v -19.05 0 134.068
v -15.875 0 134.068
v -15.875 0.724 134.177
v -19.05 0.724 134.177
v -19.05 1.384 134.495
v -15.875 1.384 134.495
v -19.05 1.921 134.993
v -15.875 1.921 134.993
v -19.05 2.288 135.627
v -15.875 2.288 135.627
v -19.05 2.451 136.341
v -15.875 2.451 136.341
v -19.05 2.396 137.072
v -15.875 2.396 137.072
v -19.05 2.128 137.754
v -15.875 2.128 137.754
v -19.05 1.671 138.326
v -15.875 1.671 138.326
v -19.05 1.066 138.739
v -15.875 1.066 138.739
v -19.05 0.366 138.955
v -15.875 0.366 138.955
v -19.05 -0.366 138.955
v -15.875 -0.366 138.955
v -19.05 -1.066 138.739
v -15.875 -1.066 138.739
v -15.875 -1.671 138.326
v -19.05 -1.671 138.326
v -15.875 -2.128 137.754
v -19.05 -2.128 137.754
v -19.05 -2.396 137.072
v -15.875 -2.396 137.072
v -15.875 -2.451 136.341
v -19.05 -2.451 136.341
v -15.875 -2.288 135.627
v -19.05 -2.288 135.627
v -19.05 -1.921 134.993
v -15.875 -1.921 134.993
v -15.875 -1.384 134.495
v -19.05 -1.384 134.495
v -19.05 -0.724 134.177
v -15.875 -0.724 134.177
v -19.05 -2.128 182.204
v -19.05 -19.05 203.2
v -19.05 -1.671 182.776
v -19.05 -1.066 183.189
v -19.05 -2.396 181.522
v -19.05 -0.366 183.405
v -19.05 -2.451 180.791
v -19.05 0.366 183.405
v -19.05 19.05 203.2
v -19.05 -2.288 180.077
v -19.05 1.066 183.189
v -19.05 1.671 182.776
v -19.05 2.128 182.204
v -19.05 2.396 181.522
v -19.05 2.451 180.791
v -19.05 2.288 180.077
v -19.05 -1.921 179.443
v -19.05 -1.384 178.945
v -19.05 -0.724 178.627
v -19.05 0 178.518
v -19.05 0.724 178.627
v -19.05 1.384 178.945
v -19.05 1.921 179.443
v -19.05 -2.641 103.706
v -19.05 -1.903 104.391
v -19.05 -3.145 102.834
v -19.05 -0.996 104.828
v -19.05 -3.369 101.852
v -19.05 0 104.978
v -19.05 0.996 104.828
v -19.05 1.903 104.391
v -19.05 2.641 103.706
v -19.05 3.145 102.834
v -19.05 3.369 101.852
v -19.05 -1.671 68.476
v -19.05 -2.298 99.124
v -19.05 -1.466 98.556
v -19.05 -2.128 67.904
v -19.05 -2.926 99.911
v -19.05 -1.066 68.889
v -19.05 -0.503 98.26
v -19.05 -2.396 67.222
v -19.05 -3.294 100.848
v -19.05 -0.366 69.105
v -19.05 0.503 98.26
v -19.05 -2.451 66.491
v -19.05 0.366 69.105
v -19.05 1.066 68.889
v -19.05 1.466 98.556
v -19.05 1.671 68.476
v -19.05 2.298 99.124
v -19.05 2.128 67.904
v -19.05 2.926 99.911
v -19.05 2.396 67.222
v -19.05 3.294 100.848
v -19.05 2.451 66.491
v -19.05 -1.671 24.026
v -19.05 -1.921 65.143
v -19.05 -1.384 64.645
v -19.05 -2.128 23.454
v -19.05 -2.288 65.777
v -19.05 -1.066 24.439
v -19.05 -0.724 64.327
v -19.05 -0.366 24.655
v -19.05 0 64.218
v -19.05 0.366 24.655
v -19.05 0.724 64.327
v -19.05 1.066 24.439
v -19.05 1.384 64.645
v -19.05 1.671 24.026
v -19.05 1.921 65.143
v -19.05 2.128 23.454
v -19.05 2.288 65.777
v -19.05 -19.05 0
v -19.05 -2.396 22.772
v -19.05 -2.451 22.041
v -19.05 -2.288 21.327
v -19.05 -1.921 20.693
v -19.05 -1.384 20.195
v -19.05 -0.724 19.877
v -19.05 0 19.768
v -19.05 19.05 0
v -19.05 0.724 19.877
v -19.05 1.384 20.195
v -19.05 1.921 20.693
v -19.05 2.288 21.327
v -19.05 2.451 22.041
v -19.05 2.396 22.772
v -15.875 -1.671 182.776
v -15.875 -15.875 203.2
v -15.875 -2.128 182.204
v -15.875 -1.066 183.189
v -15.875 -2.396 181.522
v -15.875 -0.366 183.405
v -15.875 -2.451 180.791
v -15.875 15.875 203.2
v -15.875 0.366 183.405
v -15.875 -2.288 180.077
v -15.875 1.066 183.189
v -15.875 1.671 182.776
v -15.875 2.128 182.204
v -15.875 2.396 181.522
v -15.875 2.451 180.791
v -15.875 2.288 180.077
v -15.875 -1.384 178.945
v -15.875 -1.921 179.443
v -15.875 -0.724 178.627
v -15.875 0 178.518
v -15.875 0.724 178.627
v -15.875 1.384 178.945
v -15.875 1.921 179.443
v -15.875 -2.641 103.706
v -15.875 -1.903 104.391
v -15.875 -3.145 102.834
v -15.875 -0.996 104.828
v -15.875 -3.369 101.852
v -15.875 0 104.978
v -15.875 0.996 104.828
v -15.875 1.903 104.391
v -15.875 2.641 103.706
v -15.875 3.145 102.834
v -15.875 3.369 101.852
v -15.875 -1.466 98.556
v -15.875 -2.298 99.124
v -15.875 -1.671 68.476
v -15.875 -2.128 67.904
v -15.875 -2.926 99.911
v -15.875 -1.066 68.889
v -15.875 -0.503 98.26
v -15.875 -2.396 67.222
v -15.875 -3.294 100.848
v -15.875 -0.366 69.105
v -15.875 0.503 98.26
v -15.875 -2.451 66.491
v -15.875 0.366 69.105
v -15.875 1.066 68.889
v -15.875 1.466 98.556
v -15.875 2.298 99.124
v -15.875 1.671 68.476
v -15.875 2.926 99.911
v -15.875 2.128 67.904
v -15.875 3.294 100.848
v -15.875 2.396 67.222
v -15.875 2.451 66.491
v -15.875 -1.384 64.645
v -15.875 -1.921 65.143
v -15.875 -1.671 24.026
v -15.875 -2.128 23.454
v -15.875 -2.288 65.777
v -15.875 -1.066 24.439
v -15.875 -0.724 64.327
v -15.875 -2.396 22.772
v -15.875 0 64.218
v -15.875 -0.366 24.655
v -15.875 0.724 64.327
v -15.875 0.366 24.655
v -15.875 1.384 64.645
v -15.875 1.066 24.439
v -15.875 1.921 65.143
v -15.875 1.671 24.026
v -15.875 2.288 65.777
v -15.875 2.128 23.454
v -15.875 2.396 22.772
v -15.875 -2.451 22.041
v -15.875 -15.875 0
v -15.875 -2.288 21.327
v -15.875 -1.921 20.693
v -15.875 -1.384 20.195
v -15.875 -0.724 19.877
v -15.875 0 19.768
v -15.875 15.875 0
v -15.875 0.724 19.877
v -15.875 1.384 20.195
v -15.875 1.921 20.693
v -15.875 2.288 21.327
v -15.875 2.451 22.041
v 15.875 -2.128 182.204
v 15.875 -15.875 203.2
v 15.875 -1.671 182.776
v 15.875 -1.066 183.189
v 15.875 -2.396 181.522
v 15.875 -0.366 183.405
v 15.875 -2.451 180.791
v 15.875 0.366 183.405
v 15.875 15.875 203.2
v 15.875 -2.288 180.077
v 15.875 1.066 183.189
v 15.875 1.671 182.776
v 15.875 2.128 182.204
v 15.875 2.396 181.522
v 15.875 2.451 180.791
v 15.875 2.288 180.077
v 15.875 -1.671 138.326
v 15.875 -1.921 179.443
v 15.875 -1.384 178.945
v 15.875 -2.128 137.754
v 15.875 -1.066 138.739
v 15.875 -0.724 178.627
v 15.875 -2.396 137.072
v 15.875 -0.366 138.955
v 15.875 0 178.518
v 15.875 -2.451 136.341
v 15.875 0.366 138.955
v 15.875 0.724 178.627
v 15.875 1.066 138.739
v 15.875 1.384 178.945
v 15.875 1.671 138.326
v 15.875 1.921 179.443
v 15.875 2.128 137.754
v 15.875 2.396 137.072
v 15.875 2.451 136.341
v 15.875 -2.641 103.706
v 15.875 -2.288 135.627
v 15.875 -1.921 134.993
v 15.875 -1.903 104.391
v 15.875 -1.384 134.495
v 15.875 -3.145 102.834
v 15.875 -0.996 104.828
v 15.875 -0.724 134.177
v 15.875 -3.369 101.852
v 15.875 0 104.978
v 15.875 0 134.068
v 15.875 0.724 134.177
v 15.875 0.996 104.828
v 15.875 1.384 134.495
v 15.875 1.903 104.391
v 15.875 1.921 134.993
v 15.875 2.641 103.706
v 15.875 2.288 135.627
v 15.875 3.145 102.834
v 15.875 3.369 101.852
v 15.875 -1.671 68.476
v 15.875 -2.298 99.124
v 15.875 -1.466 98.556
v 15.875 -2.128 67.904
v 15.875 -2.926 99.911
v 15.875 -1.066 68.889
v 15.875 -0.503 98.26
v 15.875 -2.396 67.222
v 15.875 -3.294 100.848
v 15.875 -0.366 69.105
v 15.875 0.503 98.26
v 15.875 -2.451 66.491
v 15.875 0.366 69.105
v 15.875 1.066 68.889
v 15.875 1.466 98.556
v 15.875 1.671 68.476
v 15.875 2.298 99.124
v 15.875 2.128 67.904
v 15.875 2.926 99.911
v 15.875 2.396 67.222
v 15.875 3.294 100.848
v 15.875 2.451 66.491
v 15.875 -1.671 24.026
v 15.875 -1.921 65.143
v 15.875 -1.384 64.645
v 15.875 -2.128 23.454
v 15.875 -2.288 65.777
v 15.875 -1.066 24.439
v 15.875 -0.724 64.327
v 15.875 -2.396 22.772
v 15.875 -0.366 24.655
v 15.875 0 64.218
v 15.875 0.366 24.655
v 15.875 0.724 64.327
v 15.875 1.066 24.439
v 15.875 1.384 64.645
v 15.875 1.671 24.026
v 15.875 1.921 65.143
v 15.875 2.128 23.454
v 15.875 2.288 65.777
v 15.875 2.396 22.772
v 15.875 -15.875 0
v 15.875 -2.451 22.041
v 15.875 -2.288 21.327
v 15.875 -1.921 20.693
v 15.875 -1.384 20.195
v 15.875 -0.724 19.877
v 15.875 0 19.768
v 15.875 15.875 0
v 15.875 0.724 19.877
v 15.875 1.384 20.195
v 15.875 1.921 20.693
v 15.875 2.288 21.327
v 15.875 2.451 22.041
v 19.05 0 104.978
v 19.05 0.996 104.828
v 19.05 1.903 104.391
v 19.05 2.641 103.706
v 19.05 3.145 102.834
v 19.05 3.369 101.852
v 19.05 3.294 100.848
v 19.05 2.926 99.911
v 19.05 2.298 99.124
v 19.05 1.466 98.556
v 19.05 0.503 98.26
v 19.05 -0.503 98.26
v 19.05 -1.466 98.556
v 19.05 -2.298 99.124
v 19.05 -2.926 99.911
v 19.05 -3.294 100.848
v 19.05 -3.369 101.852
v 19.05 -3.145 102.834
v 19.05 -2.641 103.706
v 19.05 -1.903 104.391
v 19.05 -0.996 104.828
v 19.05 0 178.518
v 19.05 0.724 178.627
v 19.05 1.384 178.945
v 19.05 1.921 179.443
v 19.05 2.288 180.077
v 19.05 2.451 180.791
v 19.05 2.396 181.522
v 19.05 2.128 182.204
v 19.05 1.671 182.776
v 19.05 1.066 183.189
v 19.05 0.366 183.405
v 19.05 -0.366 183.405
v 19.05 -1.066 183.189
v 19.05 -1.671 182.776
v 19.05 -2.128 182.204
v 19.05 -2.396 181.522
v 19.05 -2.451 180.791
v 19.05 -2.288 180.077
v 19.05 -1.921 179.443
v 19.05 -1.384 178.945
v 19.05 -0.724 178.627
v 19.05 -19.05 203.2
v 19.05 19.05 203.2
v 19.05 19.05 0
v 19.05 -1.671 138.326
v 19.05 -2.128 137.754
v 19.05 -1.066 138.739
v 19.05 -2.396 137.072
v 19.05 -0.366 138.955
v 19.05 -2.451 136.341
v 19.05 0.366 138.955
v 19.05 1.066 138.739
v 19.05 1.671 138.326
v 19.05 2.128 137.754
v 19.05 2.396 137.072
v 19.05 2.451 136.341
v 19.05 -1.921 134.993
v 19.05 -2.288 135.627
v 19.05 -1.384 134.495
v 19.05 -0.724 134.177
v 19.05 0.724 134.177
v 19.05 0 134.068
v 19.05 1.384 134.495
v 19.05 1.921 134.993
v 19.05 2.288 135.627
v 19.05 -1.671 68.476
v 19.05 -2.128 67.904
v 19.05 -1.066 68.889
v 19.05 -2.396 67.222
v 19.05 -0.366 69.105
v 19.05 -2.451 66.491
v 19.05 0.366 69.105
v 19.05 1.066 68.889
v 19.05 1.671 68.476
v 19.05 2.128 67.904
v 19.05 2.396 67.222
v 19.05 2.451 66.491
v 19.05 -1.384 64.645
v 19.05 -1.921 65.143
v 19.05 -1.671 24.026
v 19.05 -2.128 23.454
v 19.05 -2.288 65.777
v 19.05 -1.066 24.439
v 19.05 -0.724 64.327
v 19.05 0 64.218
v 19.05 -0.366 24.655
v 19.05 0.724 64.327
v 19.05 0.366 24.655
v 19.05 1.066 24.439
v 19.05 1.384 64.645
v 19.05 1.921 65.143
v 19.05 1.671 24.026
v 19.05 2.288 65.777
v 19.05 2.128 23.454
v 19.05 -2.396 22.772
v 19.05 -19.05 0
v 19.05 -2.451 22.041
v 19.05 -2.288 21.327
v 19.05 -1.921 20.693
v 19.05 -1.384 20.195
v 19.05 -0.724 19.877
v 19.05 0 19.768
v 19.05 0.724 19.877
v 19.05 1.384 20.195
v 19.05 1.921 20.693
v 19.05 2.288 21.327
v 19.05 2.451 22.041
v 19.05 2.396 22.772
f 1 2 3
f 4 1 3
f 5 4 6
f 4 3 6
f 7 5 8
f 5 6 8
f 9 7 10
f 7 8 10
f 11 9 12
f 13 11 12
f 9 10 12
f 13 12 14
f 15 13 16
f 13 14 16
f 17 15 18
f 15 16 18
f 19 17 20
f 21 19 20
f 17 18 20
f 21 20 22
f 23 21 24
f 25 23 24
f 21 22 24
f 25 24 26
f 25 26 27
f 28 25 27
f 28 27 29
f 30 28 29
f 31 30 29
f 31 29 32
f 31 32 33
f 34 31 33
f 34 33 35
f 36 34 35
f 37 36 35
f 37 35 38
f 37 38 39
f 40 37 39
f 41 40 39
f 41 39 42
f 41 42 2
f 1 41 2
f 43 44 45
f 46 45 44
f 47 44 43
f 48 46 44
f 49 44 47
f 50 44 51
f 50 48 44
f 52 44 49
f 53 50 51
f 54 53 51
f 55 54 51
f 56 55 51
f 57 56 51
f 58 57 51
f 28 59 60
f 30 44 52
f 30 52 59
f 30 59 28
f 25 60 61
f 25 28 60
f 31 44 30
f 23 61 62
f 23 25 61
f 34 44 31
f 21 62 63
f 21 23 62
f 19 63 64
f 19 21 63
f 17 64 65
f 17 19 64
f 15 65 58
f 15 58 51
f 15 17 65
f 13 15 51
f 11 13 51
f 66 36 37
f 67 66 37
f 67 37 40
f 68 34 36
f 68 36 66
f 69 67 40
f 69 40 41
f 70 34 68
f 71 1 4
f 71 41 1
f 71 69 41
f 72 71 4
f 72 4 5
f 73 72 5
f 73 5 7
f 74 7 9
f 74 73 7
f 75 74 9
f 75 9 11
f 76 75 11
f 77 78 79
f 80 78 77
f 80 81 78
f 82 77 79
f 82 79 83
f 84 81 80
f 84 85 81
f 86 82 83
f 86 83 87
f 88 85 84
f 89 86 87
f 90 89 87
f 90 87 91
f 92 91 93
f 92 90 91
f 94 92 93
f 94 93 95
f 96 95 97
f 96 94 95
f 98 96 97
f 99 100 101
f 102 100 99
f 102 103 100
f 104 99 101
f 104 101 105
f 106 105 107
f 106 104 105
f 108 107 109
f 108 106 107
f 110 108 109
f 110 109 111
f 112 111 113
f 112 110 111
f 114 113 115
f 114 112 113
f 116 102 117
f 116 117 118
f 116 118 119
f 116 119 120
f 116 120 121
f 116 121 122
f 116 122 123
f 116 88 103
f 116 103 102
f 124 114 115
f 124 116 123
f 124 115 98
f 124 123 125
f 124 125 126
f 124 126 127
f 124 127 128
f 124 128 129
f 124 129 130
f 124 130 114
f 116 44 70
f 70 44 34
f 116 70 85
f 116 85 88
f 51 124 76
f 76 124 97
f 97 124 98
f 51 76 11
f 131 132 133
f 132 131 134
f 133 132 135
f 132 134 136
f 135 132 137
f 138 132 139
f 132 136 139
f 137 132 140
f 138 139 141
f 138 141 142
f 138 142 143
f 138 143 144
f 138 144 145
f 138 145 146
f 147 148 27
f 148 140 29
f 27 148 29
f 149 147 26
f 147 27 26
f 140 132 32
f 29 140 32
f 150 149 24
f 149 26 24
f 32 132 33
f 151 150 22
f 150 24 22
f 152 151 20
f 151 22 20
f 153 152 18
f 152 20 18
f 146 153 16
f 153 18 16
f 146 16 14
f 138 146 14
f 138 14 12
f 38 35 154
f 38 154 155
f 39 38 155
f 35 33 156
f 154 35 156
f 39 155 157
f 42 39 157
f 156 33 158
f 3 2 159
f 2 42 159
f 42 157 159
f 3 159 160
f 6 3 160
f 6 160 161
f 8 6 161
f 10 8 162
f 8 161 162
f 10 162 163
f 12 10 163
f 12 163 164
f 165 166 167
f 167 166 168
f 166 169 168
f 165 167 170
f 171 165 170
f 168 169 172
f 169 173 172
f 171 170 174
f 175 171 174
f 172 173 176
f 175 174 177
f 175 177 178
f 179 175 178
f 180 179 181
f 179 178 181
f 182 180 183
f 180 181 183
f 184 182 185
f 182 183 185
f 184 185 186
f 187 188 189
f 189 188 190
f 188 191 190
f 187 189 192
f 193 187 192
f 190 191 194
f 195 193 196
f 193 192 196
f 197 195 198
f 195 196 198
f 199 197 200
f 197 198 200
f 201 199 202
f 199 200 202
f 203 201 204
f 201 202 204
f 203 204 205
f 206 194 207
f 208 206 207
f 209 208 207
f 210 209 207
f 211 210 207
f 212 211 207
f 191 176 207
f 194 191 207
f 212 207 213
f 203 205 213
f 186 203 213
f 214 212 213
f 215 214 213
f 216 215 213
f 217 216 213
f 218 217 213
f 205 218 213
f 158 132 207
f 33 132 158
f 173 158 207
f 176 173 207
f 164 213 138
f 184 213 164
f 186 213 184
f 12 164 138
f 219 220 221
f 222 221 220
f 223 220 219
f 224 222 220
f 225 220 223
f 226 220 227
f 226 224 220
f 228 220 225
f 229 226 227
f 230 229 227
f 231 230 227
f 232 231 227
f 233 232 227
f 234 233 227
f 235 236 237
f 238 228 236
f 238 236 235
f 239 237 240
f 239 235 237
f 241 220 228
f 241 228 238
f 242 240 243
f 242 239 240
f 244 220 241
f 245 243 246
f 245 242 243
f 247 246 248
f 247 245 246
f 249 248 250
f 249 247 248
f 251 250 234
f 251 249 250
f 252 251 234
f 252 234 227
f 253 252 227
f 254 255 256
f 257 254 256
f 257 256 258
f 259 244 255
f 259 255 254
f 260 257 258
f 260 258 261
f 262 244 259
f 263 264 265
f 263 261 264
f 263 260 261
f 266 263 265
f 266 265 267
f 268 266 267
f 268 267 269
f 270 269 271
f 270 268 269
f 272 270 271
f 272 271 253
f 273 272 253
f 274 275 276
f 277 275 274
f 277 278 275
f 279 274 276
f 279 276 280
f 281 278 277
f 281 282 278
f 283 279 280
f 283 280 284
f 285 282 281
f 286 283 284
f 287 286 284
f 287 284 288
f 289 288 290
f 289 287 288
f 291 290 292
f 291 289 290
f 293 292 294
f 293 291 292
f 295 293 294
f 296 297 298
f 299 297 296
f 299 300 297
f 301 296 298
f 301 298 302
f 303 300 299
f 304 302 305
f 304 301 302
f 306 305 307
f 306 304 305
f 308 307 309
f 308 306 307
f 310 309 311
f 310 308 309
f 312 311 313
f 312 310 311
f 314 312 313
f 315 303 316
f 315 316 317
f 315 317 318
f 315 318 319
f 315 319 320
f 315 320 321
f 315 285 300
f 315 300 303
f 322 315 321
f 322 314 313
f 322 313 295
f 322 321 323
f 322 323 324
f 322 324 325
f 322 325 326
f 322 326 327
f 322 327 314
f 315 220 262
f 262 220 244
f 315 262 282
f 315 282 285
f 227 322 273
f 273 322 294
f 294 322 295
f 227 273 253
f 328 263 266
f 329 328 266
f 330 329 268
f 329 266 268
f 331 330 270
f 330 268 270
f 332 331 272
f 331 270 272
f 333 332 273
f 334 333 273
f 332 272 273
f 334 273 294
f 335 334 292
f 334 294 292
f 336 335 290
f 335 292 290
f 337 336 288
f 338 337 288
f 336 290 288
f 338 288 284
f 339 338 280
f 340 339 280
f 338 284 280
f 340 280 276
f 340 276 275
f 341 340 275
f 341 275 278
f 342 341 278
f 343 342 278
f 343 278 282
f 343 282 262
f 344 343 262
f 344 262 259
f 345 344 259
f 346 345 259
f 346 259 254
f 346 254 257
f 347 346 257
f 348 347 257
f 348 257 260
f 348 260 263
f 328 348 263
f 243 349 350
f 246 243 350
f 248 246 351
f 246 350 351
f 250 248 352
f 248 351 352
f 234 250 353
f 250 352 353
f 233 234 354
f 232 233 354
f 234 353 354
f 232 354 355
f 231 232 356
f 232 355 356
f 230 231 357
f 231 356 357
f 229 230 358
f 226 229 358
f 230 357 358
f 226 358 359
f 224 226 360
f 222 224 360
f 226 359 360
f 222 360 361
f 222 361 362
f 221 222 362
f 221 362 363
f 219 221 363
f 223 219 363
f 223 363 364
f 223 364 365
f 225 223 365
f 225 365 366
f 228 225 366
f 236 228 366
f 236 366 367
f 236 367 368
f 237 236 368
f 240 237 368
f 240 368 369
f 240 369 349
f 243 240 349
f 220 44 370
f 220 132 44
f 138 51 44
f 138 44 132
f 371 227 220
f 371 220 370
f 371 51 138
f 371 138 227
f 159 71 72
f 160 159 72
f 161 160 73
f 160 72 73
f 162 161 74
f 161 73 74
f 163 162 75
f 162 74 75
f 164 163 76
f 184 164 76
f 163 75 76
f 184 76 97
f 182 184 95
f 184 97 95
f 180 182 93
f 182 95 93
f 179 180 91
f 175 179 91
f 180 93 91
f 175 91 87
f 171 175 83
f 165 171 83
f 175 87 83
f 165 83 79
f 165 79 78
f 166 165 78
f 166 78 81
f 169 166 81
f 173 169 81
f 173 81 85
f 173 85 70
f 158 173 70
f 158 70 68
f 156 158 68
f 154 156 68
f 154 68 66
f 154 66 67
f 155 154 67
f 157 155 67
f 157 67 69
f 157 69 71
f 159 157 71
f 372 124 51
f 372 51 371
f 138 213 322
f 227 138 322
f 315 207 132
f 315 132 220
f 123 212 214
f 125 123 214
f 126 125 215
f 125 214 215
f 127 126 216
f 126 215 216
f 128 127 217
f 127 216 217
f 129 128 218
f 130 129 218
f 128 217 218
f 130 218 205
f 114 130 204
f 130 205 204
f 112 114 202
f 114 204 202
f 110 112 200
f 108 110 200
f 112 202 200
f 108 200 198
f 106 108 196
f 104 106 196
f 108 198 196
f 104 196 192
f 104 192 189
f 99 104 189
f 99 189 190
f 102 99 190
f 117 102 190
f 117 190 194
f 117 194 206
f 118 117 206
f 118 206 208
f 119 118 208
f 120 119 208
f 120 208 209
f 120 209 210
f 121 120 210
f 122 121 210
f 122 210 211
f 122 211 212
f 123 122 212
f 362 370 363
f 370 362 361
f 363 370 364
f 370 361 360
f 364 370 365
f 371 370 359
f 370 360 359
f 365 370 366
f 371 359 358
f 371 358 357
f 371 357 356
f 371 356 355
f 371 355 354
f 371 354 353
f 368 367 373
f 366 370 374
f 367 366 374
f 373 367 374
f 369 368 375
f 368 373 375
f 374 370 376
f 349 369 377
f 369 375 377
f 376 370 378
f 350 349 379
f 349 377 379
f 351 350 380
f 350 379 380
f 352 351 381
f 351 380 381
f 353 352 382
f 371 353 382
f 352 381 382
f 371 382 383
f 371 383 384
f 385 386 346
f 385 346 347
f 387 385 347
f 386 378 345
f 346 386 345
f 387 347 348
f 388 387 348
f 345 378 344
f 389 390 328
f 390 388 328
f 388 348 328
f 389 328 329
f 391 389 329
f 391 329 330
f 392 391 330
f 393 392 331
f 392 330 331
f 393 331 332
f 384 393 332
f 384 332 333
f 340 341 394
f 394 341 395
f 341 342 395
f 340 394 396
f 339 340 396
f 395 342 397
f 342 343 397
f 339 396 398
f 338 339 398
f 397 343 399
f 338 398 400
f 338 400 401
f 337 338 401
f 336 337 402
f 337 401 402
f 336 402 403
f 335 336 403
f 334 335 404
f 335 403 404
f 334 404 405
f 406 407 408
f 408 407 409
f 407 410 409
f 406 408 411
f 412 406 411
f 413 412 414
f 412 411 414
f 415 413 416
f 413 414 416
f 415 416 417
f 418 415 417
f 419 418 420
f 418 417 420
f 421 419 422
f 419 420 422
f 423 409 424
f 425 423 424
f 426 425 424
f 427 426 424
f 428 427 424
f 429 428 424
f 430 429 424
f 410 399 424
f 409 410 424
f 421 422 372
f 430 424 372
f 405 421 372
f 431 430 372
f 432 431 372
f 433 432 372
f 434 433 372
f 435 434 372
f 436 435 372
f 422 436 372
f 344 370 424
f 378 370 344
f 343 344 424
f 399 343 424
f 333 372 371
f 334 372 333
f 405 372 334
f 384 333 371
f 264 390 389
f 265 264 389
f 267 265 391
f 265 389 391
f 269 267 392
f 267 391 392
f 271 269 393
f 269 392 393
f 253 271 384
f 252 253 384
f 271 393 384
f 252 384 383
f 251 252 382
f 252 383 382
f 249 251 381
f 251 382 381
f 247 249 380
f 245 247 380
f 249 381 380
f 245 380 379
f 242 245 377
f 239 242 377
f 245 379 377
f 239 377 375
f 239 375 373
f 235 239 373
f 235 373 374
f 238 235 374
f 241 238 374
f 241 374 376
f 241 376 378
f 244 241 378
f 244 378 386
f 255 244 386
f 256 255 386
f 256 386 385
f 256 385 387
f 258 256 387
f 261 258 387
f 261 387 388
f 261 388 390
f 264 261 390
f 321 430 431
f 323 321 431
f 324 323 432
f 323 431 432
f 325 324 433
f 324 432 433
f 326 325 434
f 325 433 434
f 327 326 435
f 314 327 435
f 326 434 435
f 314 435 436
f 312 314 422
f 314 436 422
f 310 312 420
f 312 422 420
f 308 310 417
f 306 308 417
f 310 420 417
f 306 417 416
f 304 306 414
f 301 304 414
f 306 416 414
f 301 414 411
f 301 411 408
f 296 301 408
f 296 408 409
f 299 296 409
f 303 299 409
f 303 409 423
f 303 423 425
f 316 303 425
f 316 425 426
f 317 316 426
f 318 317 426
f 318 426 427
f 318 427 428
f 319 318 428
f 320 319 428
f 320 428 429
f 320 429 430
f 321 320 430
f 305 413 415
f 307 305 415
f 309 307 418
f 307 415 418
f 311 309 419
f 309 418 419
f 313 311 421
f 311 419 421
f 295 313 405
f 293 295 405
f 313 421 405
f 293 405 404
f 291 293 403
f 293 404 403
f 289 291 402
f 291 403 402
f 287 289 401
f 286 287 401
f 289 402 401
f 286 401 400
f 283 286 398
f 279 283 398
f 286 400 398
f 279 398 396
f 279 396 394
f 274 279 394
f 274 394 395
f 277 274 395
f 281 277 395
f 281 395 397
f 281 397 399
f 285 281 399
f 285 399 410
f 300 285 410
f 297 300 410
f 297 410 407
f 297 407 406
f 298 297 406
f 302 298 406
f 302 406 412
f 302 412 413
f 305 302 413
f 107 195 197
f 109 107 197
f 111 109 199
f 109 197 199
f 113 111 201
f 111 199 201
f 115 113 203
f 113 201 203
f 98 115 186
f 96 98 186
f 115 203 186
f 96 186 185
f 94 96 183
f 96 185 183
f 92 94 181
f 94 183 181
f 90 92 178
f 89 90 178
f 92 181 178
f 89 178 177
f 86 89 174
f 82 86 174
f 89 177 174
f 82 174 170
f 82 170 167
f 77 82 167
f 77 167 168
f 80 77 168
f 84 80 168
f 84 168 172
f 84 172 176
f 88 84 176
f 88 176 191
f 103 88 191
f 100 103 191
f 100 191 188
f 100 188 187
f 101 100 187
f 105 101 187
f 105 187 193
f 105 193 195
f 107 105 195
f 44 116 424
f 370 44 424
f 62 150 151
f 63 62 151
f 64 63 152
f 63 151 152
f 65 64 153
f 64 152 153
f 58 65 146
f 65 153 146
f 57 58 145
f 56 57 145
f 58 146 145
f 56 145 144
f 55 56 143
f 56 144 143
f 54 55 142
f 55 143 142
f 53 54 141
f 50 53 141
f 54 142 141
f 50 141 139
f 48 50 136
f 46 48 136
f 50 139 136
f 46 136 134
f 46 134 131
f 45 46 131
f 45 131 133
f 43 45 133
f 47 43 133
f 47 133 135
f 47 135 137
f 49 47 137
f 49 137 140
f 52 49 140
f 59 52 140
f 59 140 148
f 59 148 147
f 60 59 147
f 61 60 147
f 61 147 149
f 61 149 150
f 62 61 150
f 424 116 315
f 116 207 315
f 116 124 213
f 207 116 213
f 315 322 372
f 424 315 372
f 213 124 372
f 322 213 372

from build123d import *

# Parameters (mm, degrees)
SKETCH1_W                    = 38.1
SKETCH1_H                    = 38.1
SKETCH1_W_2                  = 31.75
SKETCH1_H_2                  = 31.75
BOSS_EXTRUDE1_DEPTH          = 203.2
F_10_0_1935_DIAMETER_HOLE1_D = 4.9149
F_1_4_CLEARANCE_HOLE1_D      = 6.7564


with BuildPart() as part:
    # Sketch1 → Boss-Extrude1 (new body)
    with BuildSketch(Plane.XY):
        Rectangle(SKETCH1_W, SKETCH1_H)
        Rectangle(SKETCH1_W_2, SKETCH1_H_2, mode=Mode.SUBTRACT)
    extrude(amount=BOSS_EXTRUDE1_DEPTH)

    # #10 (0.1935) Diameter Hole1 (through all)
    with Locations(Plane.ZY.offset(19.05)):
        with Locations((22.225, 0), (66.675, 0), (136.525, 0), (180.975, 0)):
            Hole(F_10_0_1935_DIAMETER_HOLE1_D / 2)

    # 1/4 Clearance Hole1 (through all)
    with Locations(Plane(origin=(19.05, 0, 0), x_dir=(0, 0, -1), z_dir=(1, 0, 0))):
        with Locations((-101.6, 0)):
            Hole(F_1_4_CLEARANCE_HOLE1_D / 2)


solid = part.part
